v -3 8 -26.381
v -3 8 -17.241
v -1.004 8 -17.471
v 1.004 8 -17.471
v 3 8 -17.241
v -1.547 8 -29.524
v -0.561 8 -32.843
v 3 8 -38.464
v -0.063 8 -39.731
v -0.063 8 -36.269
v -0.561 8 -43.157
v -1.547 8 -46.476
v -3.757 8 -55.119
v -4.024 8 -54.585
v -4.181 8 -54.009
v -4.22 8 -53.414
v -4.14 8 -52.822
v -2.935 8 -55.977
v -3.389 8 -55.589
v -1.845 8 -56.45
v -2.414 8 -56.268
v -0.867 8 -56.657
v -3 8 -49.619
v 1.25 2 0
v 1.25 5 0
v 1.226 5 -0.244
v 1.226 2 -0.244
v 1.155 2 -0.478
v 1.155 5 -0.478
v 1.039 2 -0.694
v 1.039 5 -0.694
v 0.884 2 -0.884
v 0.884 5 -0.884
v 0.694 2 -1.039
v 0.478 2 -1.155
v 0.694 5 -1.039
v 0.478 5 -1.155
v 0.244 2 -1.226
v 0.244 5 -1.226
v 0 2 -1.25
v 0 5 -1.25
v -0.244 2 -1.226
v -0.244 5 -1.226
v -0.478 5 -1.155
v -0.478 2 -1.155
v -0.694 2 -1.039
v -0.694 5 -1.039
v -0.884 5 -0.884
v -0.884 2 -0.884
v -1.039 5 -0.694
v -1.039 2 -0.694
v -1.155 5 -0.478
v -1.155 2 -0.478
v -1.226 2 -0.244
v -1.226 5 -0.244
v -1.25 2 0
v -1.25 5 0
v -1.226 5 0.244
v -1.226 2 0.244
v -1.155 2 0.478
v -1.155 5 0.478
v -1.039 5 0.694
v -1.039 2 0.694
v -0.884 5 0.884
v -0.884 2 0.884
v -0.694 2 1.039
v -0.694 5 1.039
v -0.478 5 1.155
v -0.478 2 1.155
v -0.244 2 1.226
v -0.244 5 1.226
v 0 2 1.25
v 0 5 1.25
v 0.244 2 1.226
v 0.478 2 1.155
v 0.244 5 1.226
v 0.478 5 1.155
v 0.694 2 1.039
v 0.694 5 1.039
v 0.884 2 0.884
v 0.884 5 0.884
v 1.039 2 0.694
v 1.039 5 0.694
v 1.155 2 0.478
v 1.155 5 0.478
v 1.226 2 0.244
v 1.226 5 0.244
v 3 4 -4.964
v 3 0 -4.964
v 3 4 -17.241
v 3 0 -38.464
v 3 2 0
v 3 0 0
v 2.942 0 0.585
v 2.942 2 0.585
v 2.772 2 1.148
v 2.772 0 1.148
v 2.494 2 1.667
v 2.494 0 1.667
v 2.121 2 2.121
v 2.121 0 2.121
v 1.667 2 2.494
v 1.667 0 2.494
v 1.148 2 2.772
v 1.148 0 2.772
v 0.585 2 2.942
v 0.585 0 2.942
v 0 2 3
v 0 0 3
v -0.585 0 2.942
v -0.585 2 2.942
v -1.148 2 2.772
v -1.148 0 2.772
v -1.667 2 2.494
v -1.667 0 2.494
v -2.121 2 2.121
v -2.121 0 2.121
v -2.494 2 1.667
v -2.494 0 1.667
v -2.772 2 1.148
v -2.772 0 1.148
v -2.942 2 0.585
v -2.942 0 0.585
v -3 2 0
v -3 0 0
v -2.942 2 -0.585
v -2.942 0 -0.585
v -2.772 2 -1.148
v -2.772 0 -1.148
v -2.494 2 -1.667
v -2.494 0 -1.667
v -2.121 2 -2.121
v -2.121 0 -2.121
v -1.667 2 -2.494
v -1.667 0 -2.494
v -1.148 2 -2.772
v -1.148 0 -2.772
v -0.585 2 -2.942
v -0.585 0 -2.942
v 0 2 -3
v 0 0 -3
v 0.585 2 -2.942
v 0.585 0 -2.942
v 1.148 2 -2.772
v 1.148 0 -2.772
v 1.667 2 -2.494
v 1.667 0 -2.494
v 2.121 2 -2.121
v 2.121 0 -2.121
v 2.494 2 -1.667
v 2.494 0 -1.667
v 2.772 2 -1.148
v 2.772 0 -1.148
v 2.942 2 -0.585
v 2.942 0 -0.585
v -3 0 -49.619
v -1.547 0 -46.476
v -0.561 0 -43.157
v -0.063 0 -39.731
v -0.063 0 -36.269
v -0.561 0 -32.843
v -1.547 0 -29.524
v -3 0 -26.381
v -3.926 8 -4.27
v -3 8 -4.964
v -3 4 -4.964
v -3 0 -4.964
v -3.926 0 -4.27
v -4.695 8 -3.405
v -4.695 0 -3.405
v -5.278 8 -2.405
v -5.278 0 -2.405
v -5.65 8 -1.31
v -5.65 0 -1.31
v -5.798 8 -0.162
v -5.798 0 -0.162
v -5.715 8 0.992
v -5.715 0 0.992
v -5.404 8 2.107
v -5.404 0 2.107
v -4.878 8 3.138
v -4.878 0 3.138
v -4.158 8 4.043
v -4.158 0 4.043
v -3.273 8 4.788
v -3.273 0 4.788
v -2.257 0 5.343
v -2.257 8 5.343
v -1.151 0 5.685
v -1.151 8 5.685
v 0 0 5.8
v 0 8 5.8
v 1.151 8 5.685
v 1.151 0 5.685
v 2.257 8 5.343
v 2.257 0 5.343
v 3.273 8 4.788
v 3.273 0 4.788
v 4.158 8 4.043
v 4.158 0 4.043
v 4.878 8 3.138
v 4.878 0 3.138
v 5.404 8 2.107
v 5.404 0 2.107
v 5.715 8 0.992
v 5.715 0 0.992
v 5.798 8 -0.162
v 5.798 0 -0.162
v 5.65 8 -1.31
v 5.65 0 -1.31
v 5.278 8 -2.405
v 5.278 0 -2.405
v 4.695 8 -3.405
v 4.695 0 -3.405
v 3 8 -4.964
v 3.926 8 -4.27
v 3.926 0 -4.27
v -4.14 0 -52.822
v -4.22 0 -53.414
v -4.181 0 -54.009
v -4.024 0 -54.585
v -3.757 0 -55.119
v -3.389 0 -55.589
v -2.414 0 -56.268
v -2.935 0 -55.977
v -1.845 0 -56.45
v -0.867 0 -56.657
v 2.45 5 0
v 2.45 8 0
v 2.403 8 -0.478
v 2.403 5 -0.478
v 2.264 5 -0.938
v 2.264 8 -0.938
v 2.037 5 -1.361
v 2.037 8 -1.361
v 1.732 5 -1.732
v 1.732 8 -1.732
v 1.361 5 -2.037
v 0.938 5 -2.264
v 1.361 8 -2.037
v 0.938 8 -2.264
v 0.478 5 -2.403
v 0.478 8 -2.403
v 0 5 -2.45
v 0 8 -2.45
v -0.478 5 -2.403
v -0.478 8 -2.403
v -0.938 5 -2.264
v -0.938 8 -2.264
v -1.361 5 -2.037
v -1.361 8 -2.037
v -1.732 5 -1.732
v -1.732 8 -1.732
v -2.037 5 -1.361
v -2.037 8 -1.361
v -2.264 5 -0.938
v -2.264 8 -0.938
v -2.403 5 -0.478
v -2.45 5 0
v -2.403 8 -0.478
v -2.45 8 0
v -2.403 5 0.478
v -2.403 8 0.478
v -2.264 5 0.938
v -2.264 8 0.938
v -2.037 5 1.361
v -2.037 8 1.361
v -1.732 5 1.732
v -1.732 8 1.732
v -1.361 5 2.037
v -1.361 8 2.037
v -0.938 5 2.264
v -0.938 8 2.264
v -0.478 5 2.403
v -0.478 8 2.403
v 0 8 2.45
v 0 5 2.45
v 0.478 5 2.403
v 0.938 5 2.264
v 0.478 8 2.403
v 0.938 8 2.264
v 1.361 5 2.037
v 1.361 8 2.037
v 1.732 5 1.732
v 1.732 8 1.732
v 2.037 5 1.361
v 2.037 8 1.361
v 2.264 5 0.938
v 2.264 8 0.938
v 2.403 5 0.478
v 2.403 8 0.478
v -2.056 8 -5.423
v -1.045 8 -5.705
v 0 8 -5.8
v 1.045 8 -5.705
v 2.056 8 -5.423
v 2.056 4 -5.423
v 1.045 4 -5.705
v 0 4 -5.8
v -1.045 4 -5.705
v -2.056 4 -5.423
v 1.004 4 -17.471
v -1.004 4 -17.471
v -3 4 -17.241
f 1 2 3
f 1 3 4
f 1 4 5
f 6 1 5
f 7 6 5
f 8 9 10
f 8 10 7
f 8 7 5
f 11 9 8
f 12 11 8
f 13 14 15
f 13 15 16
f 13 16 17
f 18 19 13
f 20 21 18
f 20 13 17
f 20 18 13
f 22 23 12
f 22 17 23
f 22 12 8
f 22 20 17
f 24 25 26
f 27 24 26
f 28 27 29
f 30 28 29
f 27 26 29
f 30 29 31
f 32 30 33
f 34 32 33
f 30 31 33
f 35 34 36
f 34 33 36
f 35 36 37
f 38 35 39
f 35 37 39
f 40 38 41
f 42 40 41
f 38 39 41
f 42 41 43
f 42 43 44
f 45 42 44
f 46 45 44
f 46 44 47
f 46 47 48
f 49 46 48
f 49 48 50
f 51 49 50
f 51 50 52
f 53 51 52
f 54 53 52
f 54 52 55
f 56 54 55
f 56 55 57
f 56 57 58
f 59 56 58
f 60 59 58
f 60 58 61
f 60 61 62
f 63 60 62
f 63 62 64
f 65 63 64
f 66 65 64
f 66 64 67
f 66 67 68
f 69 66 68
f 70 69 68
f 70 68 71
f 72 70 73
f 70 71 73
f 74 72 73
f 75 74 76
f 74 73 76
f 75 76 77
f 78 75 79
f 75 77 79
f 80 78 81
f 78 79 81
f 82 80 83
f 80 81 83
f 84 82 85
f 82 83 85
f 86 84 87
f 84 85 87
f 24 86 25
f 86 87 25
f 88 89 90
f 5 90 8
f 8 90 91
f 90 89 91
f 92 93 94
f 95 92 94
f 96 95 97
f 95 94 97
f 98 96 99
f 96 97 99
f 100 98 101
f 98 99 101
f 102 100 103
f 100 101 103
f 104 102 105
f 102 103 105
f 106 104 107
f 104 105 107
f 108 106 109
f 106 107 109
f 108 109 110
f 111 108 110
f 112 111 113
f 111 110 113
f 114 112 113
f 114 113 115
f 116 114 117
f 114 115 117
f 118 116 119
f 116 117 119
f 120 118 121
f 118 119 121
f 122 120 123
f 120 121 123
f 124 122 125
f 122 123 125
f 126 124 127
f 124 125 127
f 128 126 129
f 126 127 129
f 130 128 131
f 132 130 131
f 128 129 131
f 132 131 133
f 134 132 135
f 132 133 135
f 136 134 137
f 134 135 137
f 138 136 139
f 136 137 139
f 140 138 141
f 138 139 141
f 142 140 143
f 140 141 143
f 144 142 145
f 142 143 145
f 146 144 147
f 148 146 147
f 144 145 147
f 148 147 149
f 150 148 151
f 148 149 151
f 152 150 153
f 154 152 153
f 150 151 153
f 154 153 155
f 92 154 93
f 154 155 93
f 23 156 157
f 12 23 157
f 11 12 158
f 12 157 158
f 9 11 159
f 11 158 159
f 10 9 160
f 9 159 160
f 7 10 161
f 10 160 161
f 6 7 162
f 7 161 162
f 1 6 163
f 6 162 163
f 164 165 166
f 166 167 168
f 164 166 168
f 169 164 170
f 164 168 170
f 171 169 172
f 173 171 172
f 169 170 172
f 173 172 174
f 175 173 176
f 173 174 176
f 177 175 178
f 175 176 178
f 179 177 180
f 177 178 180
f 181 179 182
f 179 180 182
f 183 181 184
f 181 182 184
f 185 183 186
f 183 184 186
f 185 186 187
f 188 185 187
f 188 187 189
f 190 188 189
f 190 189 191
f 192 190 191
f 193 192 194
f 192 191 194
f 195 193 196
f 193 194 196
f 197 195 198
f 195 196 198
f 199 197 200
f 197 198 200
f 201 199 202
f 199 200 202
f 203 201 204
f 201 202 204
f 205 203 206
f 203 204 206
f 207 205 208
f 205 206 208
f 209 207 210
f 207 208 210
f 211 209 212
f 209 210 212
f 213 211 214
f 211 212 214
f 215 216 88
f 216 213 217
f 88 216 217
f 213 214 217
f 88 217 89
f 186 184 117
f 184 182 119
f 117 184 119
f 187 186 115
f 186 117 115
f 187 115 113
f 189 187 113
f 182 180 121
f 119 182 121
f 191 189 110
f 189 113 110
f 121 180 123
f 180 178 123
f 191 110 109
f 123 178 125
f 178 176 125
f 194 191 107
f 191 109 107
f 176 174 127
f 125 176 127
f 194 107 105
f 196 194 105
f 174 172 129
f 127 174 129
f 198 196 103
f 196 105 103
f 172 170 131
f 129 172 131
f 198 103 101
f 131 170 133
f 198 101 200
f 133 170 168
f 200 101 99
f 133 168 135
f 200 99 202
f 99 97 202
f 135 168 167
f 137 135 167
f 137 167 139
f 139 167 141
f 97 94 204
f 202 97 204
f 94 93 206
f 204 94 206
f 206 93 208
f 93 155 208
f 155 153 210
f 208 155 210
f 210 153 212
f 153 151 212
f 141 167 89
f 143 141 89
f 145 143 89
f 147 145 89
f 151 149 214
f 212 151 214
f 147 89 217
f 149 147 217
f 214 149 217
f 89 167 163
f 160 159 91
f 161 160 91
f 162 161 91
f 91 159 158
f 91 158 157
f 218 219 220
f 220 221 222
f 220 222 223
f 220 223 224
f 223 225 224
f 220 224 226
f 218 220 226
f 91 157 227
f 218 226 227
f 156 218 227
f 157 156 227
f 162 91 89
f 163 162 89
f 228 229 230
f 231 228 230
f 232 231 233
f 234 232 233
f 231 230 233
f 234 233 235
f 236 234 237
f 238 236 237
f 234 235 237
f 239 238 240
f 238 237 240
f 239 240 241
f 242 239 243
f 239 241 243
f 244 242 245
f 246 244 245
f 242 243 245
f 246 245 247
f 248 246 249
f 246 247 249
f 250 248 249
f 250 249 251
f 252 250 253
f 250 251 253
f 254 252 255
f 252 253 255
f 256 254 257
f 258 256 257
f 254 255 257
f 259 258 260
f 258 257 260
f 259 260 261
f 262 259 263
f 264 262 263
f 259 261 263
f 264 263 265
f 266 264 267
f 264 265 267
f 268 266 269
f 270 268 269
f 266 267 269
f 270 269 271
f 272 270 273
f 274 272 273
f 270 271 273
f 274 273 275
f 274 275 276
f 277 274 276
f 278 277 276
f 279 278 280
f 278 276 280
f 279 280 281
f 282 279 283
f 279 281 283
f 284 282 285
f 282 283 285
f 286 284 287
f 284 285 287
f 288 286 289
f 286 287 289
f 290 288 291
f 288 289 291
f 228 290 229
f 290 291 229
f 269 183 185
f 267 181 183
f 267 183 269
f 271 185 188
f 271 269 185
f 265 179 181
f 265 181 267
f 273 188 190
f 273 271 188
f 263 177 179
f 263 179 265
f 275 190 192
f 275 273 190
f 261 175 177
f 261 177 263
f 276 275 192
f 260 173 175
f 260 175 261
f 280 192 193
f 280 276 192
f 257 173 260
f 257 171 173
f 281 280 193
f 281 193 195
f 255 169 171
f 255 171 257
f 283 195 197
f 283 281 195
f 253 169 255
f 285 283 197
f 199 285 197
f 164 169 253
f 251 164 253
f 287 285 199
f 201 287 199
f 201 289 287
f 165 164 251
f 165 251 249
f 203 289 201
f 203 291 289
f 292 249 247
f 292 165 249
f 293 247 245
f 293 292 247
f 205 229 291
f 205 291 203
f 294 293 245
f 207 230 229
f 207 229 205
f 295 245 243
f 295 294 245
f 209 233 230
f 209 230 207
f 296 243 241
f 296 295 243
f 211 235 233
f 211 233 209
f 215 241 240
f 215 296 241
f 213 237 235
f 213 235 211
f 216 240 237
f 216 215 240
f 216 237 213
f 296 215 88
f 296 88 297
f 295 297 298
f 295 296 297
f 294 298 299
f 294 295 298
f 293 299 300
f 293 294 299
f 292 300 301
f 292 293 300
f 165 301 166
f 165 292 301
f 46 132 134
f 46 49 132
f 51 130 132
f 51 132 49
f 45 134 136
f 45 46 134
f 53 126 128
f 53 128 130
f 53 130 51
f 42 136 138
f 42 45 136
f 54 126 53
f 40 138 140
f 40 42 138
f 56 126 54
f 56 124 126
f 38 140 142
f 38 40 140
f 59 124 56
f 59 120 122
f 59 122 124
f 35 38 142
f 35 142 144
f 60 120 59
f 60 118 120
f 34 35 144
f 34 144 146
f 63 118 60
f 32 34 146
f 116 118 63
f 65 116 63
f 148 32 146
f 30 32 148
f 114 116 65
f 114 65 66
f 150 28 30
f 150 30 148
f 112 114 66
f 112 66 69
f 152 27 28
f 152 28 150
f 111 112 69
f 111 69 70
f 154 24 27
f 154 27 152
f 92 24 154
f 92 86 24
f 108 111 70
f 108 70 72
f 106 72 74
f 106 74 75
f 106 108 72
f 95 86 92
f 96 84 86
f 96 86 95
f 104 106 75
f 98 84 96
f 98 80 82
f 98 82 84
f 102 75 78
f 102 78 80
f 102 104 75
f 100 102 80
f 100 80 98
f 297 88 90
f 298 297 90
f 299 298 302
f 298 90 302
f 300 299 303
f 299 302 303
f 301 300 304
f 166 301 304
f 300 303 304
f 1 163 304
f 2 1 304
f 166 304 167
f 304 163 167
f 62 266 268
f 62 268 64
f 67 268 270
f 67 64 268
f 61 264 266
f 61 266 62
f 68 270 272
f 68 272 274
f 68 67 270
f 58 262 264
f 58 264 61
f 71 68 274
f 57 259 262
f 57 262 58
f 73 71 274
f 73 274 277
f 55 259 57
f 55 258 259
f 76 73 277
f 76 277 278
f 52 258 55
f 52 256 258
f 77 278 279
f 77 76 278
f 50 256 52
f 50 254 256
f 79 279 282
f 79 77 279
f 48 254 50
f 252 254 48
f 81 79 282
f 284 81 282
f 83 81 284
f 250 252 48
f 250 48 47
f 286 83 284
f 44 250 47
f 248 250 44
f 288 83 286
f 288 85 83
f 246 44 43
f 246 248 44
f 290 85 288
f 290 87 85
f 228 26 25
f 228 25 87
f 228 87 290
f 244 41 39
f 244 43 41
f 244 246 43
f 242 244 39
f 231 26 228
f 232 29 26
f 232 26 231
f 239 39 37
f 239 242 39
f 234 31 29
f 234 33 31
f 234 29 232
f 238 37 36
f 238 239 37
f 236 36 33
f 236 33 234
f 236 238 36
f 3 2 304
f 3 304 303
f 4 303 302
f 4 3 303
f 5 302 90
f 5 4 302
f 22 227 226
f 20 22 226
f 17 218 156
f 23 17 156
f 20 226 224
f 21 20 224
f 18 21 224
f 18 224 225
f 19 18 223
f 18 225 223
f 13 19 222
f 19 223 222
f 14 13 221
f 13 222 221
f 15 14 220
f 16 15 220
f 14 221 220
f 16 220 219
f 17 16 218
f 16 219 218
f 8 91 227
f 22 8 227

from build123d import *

# Parameters (mm, degrees)
BOSS_EXTRU_1_DEPTH      = 8
ESQUISSE2_R             = 2.45
ENL_V_MAT_EXTRU_1_DEPTH = 3
ENL_V_MAT_EXTRU_2_REACH = 7
ESQUISSE3_R             = 1.25
ESQUISSE4_R             = 3
ENL_V_MAT_EXTRU_3_DEPTH = 2
ENL_V_MAT_EXTRU_4_DEPTH = 4


with BuildPart() as part:
    # Esquisse1 → Boss.-Extru.1 (new body)
    with BuildSketch(Plane(origin=(0, 0, 0), x_dir=(1, 0, 0), z_dir=(0, 1, 0))):
        with BuildLine():
            Line((-3, 26.381049961), (-3, 4.963869458))
            ThreePointArc((-3, 4.963869458), (0, -5.8), (3, 4.963869458))
            Line((3, 4.963869458), (3, 38.463869458))
            Line((3, 38.463869458), (-0.867157449, 56.657414832))
            Line((-0.867157449, 56.657414832), (-1.84530505, 56.449503141))
            ThreePointArc((-1.84530505, 56.449503141), (-3.756758837, 55.119060789), (-4.140414176, 52.821988519))
            Line((-4.140414176, 52.821988519), (-3, 49.618950039))
            ThreePointArc((-3, 49.618950039), (0, 38), (-3, 26.381049961))
        make_face()
    extrude(amount=BOSS_EXTRU_1_DEPTH)

    # Esquisse2 → Enlèv. mat.-Extru.1 (cut)
    with BuildSketch(Plane(origin=(0, 8, 0), x_dir=(1, 0, 0), z_dir=(0, 1, 0))):
        Circle(ESQUISSE2_R)
    extrude(amount=-ENL_V_MAT_EXTRU_1_DEPTH, mode=Mode.SUBTRACT)

    # Esquisse3 → Enlèv. mat.-Extru.2 (cut, up to next)
    with BuildSketch(Plane(origin=(0, 5, 0), x_dir=(1, 0, 0), z_dir=(0, 1, 0)), mode=Mode.PRIVATE) as enl_v_mat_extru_2_sk1:
        Circle(ESQUISSE3_R)
    enl_v_mat_extru_2_tool1 = extrude(enl_v_mat_extru_2_sk1.sketch, amount=-ENL_V_MAT_EXTRU_2_REACH, mode=Mode.PRIVATE) & part.part
    add(enl_v_mat_extru_2_tool1.solids().sort_by_distance((0, 5, 0))[0], mode=Mode.SUBTRACT)

    # Esquisse4 → Enlèv. mat.-Extru.3 (cut)
    with BuildSketch(Plane.XZ):
        Circle(ESQUISSE4_R)
    extrude(amount=-ENL_V_MAT_EXTRU_3_DEPTH, mode=Mode.SUBTRACT)

    # Esquisse5 → Enlèv. mat.-Extru.4 (cut)
    with BuildSketch(Plane(origin=(0, 8, 0), x_dir=(1, 0, 0), z_dir=(0, 1, 0))):
        with BuildLine():
            Line((-3, 4.963869458), (-3, 17.24093965))
            ThreePointArc((-3, 17.24093965), (0, 17.5), (3, 17.24093965))
            Line((3, 17.24093965), (3, 4.963869458))
            ThreePointArc((3, 4.963869458), (0, 5.8), (-3, 4.963869458))
        make_face()
    extrude(amount=-ENL_V_MAT_EXTRU_4_DEPTH, mode=Mode.SUBTRACT)


solid = part.part
